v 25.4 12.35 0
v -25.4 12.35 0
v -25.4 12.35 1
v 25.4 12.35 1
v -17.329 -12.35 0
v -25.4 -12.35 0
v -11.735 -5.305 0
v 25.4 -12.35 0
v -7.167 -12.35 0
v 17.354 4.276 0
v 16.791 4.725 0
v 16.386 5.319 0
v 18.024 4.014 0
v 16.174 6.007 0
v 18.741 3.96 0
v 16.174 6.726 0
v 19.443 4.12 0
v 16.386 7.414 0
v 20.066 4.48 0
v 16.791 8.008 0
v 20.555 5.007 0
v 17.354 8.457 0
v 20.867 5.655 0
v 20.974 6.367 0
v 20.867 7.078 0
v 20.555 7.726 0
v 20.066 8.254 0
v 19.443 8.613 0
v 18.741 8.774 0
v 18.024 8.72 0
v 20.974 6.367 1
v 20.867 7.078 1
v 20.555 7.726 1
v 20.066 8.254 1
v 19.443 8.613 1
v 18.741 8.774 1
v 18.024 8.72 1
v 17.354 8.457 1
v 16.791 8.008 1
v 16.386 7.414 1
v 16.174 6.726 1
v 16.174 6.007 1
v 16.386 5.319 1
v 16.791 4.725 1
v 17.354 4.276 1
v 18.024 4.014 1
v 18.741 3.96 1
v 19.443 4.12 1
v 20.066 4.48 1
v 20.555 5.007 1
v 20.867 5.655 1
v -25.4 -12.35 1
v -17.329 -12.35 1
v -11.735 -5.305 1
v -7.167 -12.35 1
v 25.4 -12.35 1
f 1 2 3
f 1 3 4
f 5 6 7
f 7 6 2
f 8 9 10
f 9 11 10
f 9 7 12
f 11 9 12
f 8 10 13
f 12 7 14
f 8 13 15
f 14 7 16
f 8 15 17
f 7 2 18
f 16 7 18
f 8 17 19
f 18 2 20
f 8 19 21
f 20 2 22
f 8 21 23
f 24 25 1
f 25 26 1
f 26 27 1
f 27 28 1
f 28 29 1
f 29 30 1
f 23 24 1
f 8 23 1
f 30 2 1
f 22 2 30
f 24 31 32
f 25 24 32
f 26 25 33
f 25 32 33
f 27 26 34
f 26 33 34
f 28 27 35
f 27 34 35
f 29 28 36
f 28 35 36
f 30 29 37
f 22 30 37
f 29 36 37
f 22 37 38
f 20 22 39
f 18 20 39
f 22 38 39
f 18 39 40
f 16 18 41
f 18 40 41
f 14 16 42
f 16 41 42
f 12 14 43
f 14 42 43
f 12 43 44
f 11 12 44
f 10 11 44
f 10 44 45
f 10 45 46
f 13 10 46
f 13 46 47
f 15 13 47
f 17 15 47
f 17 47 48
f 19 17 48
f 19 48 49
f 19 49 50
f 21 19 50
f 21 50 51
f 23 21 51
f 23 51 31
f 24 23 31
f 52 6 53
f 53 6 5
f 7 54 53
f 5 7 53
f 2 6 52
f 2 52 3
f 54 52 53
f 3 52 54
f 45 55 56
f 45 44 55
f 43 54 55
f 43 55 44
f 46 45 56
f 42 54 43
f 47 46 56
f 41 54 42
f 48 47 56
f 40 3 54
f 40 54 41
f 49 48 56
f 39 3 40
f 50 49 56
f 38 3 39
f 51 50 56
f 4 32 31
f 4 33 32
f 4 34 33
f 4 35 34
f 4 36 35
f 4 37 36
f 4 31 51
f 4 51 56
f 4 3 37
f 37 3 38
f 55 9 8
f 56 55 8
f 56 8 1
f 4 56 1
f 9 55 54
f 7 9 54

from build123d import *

# Parameters (mm, degrees)
F0_W     = 50.8
F0_H     = 24.7
F1_DEPTH = 1
F2_R     = 1.5
F3_DEPTH = 33.2
F4_R     = 2.413572
F5_DEPTH = 25
F7_DEPTH = 25


with BuildPart() as f1:
    # F0 (on Top) → F1 (new body)
    with BuildSketch(Plane.XY):
        Rectangle(F0_W, F0_H)
    extrude(amount=F1_DEPTH)

    # F2 (on face) → F3 (cut)
    with BuildSketch(Plane.XY.offset(1)):
        with Locations((19.324599, -3.538307)):
            Circle(F2_R)
    extrude(amount=F3_DEPTH, mode=Mode.SUBTRACT)

    # F4 (on face) → F5 (cut)
    with BuildSketch(Plane.XY.offset(1)):
        with Locations((18.560736, 6.366691)):
            Circle(F4_R)
    extrude(amount=-F5_DEPTH, mode=Mode.SUBTRACT)

    # F6 (on face) → F7 (cut)
    with BuildSketch(Plane.XY.offset(1)):
        Polygon((-11.734784, -5.304768), (-17.328629, -12.35), (-7.167339, -12.35), align=None)
    extrude(amount=-F7_DEPTH, mode=Mode.SUBTRACT)


solid = f1.part
